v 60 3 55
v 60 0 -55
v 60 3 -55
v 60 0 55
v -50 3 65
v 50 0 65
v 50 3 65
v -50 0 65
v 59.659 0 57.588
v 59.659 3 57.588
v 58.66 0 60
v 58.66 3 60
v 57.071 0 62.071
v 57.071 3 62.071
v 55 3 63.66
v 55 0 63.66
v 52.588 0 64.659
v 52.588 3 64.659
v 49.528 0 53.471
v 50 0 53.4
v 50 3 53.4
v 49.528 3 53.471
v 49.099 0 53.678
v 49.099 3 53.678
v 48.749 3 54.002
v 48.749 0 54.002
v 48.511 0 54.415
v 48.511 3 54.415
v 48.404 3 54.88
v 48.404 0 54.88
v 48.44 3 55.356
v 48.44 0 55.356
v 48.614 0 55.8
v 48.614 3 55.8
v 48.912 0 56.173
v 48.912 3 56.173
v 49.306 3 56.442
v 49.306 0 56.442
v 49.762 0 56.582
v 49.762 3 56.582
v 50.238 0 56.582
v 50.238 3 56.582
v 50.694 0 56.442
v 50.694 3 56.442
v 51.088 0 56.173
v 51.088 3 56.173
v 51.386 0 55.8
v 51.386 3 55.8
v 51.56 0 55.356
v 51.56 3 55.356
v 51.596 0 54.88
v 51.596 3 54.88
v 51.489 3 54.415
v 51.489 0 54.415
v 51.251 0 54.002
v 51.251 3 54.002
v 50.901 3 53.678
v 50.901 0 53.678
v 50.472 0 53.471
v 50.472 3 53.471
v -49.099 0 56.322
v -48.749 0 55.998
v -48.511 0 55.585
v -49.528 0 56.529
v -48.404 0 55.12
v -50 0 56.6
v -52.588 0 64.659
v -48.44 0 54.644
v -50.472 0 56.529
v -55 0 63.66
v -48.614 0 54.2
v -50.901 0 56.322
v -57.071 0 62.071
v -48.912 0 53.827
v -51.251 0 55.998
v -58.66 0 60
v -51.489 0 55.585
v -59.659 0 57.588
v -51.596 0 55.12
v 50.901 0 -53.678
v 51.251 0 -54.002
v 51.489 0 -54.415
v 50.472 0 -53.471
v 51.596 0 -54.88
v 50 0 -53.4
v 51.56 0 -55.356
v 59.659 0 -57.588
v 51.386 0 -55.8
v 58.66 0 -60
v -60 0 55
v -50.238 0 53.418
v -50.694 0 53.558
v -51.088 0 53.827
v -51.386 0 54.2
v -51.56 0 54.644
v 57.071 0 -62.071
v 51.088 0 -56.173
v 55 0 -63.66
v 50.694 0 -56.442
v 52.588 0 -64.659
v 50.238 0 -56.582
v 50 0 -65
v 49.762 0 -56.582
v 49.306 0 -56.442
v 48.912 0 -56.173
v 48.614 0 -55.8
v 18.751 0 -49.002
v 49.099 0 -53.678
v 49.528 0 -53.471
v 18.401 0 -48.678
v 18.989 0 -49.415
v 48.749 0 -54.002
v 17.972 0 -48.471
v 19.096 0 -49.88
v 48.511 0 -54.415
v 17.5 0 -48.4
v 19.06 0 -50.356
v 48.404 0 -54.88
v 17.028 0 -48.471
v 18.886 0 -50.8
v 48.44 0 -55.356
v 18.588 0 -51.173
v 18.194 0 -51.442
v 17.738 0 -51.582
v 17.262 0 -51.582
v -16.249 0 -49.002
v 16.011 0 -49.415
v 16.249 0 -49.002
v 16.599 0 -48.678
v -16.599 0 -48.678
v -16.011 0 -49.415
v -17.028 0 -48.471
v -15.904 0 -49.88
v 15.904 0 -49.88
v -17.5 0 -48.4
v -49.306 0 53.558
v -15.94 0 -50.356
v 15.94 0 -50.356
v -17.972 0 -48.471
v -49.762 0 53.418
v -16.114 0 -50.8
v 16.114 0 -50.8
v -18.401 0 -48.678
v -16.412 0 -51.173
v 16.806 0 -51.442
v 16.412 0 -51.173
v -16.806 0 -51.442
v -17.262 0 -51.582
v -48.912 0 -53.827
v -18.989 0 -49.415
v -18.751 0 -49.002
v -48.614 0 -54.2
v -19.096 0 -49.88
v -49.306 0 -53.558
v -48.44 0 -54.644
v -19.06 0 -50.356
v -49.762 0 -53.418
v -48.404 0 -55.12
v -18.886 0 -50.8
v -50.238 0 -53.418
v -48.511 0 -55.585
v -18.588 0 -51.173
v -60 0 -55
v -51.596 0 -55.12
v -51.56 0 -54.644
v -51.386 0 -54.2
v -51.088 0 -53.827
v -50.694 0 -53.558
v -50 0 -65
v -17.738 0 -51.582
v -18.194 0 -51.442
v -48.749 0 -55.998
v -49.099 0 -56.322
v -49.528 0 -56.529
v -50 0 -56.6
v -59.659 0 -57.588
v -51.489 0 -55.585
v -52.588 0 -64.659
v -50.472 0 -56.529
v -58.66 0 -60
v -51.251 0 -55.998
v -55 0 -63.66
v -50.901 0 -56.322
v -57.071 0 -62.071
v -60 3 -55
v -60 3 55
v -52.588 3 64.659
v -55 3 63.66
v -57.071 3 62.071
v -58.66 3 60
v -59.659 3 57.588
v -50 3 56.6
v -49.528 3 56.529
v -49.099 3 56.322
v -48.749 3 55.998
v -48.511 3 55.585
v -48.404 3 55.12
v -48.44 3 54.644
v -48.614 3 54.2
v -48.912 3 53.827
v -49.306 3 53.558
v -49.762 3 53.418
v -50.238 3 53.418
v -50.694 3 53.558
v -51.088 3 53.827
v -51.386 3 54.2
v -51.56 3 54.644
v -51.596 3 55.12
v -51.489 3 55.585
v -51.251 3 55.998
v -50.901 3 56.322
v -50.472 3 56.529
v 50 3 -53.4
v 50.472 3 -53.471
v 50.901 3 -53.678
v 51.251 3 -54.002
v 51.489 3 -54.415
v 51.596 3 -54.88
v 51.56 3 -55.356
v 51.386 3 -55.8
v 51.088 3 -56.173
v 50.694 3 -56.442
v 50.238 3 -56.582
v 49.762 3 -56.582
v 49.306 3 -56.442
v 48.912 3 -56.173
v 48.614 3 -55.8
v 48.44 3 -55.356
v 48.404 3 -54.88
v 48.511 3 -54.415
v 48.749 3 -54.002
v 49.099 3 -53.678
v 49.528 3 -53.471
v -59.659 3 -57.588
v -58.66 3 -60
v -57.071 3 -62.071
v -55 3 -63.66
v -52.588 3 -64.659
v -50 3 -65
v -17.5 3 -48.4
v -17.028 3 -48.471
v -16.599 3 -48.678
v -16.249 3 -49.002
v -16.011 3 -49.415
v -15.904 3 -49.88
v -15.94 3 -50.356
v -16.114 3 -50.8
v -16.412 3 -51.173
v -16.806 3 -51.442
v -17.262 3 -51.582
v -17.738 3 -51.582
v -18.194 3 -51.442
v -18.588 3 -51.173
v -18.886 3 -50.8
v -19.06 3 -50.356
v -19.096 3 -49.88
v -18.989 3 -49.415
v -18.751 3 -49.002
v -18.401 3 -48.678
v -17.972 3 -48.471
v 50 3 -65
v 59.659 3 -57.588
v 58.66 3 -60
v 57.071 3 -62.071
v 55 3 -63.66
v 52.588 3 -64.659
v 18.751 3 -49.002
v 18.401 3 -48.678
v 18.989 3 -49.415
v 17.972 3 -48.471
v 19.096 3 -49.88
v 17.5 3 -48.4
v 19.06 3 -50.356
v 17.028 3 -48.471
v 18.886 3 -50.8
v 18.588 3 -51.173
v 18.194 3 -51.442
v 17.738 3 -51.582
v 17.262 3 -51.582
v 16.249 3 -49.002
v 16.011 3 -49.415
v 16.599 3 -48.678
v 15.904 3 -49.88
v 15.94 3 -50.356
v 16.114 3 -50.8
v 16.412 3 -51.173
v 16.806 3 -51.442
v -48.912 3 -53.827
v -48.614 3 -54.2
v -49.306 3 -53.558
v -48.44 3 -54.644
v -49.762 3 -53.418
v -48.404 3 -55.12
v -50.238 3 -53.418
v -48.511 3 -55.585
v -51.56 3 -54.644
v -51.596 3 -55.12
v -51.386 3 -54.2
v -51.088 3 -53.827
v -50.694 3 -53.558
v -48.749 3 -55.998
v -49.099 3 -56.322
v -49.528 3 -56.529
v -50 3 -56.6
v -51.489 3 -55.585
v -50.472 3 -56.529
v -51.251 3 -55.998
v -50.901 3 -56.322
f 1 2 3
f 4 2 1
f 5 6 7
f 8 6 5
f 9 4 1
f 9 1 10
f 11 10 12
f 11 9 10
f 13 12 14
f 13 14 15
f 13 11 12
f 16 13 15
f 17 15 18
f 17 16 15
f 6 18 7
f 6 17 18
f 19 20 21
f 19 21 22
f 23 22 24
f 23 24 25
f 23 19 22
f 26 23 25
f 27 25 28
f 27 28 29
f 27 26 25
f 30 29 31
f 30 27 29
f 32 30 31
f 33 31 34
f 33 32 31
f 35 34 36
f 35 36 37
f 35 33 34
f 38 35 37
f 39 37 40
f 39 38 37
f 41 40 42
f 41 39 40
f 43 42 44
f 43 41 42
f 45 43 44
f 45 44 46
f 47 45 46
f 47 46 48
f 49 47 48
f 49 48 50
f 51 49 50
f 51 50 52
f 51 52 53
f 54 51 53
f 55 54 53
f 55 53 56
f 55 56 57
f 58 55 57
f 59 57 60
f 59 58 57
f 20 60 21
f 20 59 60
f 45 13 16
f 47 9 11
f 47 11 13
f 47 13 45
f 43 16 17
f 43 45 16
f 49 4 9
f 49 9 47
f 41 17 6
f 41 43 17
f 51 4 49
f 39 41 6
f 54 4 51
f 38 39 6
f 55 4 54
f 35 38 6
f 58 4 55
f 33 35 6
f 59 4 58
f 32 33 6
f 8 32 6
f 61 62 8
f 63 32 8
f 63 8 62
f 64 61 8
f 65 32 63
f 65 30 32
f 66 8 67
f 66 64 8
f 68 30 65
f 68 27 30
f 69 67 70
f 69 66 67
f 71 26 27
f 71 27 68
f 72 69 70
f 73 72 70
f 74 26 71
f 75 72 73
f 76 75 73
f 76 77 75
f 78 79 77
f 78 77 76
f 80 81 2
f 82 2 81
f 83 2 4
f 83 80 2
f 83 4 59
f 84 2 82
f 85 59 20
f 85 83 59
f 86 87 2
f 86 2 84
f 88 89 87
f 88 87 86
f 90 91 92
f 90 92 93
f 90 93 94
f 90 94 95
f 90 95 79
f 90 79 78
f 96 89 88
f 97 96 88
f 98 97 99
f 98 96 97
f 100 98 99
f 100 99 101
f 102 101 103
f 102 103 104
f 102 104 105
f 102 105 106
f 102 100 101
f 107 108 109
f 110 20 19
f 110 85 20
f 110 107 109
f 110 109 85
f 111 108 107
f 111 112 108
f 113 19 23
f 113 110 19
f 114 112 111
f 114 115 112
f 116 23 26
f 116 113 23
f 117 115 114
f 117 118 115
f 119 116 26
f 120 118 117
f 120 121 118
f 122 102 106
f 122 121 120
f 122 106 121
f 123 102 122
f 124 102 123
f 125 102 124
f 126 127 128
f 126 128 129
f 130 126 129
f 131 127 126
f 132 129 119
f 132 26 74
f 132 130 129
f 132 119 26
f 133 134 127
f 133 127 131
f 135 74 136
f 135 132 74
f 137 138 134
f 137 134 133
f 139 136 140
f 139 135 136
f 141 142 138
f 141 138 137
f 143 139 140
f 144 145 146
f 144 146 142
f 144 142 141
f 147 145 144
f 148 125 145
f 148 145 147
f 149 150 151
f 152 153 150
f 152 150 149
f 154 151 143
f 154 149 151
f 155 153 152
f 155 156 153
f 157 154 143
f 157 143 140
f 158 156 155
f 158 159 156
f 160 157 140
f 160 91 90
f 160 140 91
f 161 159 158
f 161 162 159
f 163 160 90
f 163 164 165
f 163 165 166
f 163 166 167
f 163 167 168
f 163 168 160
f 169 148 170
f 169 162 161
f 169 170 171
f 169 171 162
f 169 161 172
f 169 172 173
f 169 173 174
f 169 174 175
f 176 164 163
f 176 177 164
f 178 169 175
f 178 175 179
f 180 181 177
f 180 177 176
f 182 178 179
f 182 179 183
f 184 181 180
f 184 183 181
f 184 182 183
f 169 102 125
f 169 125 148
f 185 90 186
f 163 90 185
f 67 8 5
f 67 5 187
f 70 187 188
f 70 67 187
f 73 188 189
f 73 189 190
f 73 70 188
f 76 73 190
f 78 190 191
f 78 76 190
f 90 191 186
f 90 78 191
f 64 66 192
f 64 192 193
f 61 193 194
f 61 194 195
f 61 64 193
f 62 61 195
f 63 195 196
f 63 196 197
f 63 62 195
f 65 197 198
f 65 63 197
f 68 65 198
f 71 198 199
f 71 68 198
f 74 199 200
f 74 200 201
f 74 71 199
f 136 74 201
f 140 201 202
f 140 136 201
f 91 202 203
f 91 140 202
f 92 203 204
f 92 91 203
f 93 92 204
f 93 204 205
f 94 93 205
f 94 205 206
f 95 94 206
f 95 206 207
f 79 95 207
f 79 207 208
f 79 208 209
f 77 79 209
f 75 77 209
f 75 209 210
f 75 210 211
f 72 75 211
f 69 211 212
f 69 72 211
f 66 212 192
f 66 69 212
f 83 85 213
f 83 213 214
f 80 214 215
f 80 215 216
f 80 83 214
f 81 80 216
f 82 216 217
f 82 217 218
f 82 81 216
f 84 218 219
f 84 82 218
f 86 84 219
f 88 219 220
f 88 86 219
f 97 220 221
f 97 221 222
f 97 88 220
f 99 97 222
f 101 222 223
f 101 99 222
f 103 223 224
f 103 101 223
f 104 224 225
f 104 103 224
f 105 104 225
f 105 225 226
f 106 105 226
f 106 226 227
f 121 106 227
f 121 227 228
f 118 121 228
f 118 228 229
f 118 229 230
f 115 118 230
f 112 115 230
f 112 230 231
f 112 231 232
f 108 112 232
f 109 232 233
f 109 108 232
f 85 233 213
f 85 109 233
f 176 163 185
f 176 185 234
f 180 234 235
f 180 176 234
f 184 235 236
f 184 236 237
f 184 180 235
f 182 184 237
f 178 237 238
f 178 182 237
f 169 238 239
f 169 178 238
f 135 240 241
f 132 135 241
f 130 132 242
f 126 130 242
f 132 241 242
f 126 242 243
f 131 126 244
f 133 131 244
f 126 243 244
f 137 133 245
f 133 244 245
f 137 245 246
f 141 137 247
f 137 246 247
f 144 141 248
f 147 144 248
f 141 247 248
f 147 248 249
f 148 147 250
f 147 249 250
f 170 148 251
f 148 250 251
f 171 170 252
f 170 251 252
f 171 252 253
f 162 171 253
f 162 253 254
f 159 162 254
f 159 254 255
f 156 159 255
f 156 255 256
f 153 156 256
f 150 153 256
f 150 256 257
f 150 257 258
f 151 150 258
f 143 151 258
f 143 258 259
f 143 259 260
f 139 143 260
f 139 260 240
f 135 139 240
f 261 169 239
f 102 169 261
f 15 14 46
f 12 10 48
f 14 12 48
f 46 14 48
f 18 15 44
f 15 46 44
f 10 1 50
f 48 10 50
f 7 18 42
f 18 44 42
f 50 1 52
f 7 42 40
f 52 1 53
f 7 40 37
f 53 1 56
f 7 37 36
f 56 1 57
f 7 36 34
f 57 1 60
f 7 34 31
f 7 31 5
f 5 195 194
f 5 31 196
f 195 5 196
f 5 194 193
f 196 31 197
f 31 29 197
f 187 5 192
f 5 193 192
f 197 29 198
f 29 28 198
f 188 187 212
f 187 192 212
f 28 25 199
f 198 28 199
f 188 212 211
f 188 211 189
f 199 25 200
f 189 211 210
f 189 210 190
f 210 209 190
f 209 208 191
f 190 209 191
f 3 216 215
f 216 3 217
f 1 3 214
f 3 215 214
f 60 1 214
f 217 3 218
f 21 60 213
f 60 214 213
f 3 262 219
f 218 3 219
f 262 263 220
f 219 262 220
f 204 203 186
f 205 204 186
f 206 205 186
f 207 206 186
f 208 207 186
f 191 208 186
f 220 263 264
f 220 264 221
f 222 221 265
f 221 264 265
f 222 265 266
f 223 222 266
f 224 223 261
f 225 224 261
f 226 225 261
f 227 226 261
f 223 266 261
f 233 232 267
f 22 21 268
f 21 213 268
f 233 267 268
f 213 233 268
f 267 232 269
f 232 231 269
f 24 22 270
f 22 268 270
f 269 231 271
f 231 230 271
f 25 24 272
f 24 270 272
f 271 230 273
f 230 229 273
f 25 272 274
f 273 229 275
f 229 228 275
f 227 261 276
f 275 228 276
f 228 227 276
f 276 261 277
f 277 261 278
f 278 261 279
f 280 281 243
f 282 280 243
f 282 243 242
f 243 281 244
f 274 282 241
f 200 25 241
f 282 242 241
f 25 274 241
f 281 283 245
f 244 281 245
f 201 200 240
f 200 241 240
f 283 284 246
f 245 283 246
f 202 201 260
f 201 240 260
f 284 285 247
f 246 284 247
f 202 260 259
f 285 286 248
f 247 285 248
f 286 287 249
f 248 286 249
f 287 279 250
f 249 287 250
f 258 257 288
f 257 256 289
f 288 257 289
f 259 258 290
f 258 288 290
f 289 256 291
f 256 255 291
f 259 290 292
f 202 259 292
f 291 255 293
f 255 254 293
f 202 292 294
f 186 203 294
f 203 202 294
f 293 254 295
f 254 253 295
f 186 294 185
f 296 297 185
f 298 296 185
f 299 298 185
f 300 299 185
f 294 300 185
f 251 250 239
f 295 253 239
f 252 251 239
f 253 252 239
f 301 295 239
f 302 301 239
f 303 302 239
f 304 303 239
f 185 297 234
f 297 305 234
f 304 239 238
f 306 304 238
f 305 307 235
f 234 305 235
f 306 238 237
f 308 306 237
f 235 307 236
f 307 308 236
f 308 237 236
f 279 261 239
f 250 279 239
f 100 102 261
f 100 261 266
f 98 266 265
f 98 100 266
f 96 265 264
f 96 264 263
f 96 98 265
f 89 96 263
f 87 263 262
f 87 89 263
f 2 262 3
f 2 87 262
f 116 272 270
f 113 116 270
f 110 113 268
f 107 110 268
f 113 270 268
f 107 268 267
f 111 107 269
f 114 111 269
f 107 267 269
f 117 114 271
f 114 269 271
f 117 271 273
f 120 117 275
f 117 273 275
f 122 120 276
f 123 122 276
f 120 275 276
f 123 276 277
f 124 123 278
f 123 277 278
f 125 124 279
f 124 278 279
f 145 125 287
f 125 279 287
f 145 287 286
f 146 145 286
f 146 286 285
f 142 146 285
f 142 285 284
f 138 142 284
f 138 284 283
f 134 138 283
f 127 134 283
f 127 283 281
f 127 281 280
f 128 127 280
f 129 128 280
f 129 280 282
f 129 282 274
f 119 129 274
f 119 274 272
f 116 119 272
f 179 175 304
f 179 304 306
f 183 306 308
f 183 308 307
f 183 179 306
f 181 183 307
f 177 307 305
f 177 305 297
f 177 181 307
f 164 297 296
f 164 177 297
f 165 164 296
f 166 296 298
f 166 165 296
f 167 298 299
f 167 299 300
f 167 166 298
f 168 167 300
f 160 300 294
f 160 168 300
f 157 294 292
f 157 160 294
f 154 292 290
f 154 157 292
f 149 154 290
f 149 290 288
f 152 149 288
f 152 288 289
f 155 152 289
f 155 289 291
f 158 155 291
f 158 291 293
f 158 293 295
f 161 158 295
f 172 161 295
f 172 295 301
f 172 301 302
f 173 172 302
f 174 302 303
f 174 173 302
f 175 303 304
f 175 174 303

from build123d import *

# Parameters (mm, degrees)
SKETCH1_R           = 1.6
BOSS_EXTRUDE1_DEPTH = 3
SKETCH2_R           = 1.6
CUT_EXTRUDE1_DEPTH  = 89.509886453


with BuildPart() as part:
    # Sketch1 → Boss-Extrude1 (new body)
    with BuildSketch(Plane(origin=(0, 0, 0), x_dir=(1, 0, 0), z_dir=(0, 1, 0))):
        with BuildLine():
            Line((-50, 65), (50, 65))
            ThreePointArc((50, 65), (57.071067812, 62.071067812), (60, 55))
            Line((60, 55), (60, -55))
            ThreePointArc((60, -55), (57.071067812, -62.071067812), (50, -65))
            Line((50, -65), (-50, -65))
            ThreePointArc((-50, -65), (-57.071067812, -62.071067812), (-60, -55))
            Line((-60, -55), (-60, 55))
            ThreePointArc((-60, 55), (-57.071067812, 62.071067812), (-50, 65))
        make_face()
        with Locations(Location((50, -55, 0), (0, 0, 90))):
            Circle(SKETCH1_R, mode=Mode.SUBTRACT)
        with Locations(Location((-50, -55, 0), (0, 0, 270))):
            Circle(SKETCH1_R, mode=Mode.SUBTRACT)
        with Locations(Location((50, 55, 0), (0, 0, 270))):
            Circle(SKETCH1_R, mode=Mode.SUBTRACT)
        with Locations(Location((-50, 55, 0), (0, 0, 90))):
            Circle(SKETCH1_R, mode=Mode.SUBTRACT)
    extrude(amount=BOSS_EXTRUDE1_DEPTH)

    # Sketch2 → Cut-Extrude1 (cut, through all)
    with BuildSketch(Plane(origin=(0, 3, 0), x_dir=(1, 0, 0), z_dir=(0, 1, 0))):
        with Locations(Location((-17.5, 50, 0), (0, 0, 270))):
            Circle(SKETCH2_R)
        with Locations(Location((17.5, 50, 0), (0, 0, 270))):
            Circle(SKETCH2_R)
    extrude(amount=-CUT_EXTRUDE1_DEPTH, mode=Mode.SUBTRACT)


solid = part.part
